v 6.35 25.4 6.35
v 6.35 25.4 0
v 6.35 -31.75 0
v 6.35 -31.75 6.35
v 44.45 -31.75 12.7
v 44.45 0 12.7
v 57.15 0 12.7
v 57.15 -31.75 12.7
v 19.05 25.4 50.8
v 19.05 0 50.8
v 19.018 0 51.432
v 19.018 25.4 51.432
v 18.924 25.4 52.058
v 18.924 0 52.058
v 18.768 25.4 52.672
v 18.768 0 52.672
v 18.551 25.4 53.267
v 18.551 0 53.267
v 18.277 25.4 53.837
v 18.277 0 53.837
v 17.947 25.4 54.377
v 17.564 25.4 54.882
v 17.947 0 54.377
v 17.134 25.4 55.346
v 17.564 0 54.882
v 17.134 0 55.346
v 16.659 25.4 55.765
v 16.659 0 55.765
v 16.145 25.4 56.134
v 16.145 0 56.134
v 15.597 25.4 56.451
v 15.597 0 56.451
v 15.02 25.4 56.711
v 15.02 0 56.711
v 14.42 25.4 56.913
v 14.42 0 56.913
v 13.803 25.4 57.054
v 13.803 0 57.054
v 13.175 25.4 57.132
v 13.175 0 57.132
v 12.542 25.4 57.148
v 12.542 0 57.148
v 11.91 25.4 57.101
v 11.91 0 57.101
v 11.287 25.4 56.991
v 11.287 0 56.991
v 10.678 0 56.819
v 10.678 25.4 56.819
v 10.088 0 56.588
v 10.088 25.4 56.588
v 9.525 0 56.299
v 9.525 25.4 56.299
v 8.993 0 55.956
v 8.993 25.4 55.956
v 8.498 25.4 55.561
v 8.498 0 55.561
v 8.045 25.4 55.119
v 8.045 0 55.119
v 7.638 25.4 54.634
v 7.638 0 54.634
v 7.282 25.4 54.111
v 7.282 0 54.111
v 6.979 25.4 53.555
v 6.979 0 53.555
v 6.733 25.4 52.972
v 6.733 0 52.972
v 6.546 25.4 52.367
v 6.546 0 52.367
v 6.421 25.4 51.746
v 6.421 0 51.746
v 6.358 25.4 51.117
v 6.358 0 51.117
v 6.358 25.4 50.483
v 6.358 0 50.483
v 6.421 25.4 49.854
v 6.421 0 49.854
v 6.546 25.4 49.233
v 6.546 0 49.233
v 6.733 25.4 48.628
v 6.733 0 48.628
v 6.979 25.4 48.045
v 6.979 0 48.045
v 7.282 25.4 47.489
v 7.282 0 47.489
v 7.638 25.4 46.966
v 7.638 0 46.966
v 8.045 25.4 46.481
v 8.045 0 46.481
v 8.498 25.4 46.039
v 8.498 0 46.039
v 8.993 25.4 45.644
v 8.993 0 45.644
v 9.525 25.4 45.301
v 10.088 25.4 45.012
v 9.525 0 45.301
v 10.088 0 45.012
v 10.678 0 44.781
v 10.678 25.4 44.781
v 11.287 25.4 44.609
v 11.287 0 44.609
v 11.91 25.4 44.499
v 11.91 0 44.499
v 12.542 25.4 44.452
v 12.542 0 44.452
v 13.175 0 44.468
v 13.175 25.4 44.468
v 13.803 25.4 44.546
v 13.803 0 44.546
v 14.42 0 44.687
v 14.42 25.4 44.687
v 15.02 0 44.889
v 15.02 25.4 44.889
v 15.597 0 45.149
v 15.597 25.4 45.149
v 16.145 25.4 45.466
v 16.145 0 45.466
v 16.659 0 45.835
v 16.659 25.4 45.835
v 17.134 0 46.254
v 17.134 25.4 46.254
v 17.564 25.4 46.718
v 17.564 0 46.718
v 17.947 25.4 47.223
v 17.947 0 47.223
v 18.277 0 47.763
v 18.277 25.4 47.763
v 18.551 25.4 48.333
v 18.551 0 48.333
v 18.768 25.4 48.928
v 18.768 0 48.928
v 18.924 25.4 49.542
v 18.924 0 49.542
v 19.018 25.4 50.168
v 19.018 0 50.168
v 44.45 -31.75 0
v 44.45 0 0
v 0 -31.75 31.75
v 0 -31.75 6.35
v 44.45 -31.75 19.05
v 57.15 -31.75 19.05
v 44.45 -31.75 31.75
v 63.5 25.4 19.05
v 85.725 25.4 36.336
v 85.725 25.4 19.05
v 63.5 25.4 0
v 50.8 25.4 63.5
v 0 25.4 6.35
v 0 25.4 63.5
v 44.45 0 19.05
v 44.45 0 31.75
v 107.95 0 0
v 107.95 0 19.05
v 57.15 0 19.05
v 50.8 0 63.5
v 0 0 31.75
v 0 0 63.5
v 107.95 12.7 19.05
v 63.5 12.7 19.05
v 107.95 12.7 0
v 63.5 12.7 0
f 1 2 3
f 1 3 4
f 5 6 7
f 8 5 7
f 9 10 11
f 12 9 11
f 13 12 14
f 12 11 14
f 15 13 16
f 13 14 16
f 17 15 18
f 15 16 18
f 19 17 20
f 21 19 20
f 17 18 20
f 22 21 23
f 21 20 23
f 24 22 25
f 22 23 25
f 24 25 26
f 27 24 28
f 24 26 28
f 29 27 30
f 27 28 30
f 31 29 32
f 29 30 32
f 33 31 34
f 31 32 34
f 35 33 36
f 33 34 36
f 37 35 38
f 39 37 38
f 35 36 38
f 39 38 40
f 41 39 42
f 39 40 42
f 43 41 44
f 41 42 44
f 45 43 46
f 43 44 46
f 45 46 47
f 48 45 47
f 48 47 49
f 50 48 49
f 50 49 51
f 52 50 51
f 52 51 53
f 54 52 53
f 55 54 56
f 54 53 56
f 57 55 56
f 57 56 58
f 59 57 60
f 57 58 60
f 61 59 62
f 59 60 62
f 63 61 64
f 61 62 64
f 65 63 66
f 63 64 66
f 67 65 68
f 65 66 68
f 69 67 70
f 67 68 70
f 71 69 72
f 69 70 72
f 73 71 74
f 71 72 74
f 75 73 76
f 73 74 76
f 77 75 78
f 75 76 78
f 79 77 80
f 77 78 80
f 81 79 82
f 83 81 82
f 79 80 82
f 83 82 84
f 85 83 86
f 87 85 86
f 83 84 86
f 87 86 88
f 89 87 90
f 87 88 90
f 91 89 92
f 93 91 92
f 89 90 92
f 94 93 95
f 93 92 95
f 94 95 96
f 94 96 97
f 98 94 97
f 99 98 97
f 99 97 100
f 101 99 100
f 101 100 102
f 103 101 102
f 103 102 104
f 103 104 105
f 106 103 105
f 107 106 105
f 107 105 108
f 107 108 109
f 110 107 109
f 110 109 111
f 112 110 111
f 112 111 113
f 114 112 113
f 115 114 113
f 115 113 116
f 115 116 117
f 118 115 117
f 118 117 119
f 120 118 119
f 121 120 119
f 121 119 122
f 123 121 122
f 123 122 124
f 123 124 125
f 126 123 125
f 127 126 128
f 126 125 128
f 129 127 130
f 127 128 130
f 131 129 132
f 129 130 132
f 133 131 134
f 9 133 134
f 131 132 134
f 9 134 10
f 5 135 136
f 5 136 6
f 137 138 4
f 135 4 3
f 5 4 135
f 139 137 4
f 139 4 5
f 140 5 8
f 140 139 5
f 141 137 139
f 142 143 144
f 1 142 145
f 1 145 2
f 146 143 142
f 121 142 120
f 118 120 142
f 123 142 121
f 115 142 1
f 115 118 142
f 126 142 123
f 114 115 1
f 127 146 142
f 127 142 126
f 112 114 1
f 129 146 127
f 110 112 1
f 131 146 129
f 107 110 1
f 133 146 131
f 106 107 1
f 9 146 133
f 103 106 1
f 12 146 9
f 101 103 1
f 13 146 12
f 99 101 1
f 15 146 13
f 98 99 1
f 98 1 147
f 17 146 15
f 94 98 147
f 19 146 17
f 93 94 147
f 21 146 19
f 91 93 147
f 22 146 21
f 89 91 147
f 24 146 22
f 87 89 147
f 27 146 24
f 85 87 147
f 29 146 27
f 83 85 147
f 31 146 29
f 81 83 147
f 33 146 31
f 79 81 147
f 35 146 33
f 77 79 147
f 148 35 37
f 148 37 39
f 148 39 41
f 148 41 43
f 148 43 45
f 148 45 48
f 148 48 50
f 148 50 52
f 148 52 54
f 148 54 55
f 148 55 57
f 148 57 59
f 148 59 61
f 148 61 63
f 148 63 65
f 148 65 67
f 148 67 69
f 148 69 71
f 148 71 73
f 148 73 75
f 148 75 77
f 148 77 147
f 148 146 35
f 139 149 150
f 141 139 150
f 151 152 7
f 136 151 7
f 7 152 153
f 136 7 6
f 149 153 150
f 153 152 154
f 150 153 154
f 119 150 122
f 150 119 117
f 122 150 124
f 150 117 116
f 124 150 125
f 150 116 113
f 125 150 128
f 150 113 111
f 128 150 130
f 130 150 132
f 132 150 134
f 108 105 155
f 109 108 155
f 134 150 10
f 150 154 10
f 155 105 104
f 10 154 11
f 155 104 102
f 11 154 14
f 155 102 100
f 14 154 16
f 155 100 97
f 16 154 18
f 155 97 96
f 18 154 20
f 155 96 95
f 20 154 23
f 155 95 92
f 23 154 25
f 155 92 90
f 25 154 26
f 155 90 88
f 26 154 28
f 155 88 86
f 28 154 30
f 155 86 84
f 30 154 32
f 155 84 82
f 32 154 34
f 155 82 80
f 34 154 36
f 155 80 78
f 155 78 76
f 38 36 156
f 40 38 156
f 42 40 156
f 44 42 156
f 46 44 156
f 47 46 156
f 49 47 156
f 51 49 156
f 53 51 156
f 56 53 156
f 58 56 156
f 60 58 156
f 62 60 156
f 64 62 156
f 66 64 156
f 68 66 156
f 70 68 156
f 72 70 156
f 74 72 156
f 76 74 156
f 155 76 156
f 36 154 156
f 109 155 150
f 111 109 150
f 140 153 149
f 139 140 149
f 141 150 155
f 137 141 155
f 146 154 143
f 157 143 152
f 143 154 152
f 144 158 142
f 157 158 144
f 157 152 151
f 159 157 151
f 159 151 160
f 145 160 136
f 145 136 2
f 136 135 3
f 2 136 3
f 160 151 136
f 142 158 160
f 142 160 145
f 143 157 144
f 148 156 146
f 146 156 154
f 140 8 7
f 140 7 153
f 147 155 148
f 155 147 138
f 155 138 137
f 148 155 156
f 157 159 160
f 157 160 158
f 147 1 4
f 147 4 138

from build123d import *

# Parameters (mm, degrees)
F1_DEPTH = 31.75
F3_DEPTH = 25.4
F4_R     = 6.35
F5_DEPTH = 25.4
F6_W     = 12.7
F6_H     = 19.05
F7_DEPTH = 44.45
F9_DEPTH = 44.451


with BuildPart() as f1:
    # F0 (on Front) → F1 (new body)
    with BuildSketch(Plane.XZ):
        Polygon((6.35, 6.35), (6.35, 0), (44.45, 0), (44.45, 12.7), (57.15, 12.7), (57.15, 19.05), (44.45, 19.05), (44.45, 31.75), (0, 31.75), (0, 6.35), align=None)
    extrude(amount=F1_DEPTH)

    # F2 (on face) → F3 (join)
    with BuildSketch(Plane(origin=(0, 0, 0), x_dir=(-1, 0, 0), z_dir=(0, 1, 0))):
        Polygon((-107.95, 0), (-44.45, 0), (-44.45, 12.7), (-57.15, 12.7), (-57.15, 19.05), (-44.45, 19.05), (-44.45, 31.75), (0, 31.75), (0, 63.5), (-50.8, 63.5), (-107.95, 19.05), align=None)
        Polygon((-44.45, 0), (-6.35, 0), (-6.35, 6.35), (0, 6.35), (0, 31.75), (-44.45, 31.75), (-44.45, 19.05), (-57.15, 19.05), (-57.15, 12.7), (-44.45, 12.7), align=None)
    extrude(amount=F3_DEPTH)

    # F4 (on face) → F5 (cut, through all)
    with BuildSketch(Plane.XZ):
        with Locations((12.7, 50.8)):
            Circle(F4_R)
    extrude(amount=-F5_DEPTH, mode=Mode.SUBTRACT)

    # F6 (on face) → F7 (cut)
    with BuildSketch(Plane.YZ.offset(107.95)):
        with Locations((19.05, 9.525)):
            Rectangle(F6_W, F6_H)
    extrude(amount=-F7_DEPTH, mode=Mode.SUBTRACT)

    # F8 (on face) → F9 (cut, through all)
    with BuildSketch(Plane(origin=(0, 0, 19.05), x_dir=(1, 0, 0), z_dir=(0, 0, -1))):
        Polygon((107.95, -25.4), (107.95, -12.7), (85.725, -25.4), align=None)
    extrude(amount=-F9_DEPTH, mode=Mode.SUBTRACT)


solid = f1.part
